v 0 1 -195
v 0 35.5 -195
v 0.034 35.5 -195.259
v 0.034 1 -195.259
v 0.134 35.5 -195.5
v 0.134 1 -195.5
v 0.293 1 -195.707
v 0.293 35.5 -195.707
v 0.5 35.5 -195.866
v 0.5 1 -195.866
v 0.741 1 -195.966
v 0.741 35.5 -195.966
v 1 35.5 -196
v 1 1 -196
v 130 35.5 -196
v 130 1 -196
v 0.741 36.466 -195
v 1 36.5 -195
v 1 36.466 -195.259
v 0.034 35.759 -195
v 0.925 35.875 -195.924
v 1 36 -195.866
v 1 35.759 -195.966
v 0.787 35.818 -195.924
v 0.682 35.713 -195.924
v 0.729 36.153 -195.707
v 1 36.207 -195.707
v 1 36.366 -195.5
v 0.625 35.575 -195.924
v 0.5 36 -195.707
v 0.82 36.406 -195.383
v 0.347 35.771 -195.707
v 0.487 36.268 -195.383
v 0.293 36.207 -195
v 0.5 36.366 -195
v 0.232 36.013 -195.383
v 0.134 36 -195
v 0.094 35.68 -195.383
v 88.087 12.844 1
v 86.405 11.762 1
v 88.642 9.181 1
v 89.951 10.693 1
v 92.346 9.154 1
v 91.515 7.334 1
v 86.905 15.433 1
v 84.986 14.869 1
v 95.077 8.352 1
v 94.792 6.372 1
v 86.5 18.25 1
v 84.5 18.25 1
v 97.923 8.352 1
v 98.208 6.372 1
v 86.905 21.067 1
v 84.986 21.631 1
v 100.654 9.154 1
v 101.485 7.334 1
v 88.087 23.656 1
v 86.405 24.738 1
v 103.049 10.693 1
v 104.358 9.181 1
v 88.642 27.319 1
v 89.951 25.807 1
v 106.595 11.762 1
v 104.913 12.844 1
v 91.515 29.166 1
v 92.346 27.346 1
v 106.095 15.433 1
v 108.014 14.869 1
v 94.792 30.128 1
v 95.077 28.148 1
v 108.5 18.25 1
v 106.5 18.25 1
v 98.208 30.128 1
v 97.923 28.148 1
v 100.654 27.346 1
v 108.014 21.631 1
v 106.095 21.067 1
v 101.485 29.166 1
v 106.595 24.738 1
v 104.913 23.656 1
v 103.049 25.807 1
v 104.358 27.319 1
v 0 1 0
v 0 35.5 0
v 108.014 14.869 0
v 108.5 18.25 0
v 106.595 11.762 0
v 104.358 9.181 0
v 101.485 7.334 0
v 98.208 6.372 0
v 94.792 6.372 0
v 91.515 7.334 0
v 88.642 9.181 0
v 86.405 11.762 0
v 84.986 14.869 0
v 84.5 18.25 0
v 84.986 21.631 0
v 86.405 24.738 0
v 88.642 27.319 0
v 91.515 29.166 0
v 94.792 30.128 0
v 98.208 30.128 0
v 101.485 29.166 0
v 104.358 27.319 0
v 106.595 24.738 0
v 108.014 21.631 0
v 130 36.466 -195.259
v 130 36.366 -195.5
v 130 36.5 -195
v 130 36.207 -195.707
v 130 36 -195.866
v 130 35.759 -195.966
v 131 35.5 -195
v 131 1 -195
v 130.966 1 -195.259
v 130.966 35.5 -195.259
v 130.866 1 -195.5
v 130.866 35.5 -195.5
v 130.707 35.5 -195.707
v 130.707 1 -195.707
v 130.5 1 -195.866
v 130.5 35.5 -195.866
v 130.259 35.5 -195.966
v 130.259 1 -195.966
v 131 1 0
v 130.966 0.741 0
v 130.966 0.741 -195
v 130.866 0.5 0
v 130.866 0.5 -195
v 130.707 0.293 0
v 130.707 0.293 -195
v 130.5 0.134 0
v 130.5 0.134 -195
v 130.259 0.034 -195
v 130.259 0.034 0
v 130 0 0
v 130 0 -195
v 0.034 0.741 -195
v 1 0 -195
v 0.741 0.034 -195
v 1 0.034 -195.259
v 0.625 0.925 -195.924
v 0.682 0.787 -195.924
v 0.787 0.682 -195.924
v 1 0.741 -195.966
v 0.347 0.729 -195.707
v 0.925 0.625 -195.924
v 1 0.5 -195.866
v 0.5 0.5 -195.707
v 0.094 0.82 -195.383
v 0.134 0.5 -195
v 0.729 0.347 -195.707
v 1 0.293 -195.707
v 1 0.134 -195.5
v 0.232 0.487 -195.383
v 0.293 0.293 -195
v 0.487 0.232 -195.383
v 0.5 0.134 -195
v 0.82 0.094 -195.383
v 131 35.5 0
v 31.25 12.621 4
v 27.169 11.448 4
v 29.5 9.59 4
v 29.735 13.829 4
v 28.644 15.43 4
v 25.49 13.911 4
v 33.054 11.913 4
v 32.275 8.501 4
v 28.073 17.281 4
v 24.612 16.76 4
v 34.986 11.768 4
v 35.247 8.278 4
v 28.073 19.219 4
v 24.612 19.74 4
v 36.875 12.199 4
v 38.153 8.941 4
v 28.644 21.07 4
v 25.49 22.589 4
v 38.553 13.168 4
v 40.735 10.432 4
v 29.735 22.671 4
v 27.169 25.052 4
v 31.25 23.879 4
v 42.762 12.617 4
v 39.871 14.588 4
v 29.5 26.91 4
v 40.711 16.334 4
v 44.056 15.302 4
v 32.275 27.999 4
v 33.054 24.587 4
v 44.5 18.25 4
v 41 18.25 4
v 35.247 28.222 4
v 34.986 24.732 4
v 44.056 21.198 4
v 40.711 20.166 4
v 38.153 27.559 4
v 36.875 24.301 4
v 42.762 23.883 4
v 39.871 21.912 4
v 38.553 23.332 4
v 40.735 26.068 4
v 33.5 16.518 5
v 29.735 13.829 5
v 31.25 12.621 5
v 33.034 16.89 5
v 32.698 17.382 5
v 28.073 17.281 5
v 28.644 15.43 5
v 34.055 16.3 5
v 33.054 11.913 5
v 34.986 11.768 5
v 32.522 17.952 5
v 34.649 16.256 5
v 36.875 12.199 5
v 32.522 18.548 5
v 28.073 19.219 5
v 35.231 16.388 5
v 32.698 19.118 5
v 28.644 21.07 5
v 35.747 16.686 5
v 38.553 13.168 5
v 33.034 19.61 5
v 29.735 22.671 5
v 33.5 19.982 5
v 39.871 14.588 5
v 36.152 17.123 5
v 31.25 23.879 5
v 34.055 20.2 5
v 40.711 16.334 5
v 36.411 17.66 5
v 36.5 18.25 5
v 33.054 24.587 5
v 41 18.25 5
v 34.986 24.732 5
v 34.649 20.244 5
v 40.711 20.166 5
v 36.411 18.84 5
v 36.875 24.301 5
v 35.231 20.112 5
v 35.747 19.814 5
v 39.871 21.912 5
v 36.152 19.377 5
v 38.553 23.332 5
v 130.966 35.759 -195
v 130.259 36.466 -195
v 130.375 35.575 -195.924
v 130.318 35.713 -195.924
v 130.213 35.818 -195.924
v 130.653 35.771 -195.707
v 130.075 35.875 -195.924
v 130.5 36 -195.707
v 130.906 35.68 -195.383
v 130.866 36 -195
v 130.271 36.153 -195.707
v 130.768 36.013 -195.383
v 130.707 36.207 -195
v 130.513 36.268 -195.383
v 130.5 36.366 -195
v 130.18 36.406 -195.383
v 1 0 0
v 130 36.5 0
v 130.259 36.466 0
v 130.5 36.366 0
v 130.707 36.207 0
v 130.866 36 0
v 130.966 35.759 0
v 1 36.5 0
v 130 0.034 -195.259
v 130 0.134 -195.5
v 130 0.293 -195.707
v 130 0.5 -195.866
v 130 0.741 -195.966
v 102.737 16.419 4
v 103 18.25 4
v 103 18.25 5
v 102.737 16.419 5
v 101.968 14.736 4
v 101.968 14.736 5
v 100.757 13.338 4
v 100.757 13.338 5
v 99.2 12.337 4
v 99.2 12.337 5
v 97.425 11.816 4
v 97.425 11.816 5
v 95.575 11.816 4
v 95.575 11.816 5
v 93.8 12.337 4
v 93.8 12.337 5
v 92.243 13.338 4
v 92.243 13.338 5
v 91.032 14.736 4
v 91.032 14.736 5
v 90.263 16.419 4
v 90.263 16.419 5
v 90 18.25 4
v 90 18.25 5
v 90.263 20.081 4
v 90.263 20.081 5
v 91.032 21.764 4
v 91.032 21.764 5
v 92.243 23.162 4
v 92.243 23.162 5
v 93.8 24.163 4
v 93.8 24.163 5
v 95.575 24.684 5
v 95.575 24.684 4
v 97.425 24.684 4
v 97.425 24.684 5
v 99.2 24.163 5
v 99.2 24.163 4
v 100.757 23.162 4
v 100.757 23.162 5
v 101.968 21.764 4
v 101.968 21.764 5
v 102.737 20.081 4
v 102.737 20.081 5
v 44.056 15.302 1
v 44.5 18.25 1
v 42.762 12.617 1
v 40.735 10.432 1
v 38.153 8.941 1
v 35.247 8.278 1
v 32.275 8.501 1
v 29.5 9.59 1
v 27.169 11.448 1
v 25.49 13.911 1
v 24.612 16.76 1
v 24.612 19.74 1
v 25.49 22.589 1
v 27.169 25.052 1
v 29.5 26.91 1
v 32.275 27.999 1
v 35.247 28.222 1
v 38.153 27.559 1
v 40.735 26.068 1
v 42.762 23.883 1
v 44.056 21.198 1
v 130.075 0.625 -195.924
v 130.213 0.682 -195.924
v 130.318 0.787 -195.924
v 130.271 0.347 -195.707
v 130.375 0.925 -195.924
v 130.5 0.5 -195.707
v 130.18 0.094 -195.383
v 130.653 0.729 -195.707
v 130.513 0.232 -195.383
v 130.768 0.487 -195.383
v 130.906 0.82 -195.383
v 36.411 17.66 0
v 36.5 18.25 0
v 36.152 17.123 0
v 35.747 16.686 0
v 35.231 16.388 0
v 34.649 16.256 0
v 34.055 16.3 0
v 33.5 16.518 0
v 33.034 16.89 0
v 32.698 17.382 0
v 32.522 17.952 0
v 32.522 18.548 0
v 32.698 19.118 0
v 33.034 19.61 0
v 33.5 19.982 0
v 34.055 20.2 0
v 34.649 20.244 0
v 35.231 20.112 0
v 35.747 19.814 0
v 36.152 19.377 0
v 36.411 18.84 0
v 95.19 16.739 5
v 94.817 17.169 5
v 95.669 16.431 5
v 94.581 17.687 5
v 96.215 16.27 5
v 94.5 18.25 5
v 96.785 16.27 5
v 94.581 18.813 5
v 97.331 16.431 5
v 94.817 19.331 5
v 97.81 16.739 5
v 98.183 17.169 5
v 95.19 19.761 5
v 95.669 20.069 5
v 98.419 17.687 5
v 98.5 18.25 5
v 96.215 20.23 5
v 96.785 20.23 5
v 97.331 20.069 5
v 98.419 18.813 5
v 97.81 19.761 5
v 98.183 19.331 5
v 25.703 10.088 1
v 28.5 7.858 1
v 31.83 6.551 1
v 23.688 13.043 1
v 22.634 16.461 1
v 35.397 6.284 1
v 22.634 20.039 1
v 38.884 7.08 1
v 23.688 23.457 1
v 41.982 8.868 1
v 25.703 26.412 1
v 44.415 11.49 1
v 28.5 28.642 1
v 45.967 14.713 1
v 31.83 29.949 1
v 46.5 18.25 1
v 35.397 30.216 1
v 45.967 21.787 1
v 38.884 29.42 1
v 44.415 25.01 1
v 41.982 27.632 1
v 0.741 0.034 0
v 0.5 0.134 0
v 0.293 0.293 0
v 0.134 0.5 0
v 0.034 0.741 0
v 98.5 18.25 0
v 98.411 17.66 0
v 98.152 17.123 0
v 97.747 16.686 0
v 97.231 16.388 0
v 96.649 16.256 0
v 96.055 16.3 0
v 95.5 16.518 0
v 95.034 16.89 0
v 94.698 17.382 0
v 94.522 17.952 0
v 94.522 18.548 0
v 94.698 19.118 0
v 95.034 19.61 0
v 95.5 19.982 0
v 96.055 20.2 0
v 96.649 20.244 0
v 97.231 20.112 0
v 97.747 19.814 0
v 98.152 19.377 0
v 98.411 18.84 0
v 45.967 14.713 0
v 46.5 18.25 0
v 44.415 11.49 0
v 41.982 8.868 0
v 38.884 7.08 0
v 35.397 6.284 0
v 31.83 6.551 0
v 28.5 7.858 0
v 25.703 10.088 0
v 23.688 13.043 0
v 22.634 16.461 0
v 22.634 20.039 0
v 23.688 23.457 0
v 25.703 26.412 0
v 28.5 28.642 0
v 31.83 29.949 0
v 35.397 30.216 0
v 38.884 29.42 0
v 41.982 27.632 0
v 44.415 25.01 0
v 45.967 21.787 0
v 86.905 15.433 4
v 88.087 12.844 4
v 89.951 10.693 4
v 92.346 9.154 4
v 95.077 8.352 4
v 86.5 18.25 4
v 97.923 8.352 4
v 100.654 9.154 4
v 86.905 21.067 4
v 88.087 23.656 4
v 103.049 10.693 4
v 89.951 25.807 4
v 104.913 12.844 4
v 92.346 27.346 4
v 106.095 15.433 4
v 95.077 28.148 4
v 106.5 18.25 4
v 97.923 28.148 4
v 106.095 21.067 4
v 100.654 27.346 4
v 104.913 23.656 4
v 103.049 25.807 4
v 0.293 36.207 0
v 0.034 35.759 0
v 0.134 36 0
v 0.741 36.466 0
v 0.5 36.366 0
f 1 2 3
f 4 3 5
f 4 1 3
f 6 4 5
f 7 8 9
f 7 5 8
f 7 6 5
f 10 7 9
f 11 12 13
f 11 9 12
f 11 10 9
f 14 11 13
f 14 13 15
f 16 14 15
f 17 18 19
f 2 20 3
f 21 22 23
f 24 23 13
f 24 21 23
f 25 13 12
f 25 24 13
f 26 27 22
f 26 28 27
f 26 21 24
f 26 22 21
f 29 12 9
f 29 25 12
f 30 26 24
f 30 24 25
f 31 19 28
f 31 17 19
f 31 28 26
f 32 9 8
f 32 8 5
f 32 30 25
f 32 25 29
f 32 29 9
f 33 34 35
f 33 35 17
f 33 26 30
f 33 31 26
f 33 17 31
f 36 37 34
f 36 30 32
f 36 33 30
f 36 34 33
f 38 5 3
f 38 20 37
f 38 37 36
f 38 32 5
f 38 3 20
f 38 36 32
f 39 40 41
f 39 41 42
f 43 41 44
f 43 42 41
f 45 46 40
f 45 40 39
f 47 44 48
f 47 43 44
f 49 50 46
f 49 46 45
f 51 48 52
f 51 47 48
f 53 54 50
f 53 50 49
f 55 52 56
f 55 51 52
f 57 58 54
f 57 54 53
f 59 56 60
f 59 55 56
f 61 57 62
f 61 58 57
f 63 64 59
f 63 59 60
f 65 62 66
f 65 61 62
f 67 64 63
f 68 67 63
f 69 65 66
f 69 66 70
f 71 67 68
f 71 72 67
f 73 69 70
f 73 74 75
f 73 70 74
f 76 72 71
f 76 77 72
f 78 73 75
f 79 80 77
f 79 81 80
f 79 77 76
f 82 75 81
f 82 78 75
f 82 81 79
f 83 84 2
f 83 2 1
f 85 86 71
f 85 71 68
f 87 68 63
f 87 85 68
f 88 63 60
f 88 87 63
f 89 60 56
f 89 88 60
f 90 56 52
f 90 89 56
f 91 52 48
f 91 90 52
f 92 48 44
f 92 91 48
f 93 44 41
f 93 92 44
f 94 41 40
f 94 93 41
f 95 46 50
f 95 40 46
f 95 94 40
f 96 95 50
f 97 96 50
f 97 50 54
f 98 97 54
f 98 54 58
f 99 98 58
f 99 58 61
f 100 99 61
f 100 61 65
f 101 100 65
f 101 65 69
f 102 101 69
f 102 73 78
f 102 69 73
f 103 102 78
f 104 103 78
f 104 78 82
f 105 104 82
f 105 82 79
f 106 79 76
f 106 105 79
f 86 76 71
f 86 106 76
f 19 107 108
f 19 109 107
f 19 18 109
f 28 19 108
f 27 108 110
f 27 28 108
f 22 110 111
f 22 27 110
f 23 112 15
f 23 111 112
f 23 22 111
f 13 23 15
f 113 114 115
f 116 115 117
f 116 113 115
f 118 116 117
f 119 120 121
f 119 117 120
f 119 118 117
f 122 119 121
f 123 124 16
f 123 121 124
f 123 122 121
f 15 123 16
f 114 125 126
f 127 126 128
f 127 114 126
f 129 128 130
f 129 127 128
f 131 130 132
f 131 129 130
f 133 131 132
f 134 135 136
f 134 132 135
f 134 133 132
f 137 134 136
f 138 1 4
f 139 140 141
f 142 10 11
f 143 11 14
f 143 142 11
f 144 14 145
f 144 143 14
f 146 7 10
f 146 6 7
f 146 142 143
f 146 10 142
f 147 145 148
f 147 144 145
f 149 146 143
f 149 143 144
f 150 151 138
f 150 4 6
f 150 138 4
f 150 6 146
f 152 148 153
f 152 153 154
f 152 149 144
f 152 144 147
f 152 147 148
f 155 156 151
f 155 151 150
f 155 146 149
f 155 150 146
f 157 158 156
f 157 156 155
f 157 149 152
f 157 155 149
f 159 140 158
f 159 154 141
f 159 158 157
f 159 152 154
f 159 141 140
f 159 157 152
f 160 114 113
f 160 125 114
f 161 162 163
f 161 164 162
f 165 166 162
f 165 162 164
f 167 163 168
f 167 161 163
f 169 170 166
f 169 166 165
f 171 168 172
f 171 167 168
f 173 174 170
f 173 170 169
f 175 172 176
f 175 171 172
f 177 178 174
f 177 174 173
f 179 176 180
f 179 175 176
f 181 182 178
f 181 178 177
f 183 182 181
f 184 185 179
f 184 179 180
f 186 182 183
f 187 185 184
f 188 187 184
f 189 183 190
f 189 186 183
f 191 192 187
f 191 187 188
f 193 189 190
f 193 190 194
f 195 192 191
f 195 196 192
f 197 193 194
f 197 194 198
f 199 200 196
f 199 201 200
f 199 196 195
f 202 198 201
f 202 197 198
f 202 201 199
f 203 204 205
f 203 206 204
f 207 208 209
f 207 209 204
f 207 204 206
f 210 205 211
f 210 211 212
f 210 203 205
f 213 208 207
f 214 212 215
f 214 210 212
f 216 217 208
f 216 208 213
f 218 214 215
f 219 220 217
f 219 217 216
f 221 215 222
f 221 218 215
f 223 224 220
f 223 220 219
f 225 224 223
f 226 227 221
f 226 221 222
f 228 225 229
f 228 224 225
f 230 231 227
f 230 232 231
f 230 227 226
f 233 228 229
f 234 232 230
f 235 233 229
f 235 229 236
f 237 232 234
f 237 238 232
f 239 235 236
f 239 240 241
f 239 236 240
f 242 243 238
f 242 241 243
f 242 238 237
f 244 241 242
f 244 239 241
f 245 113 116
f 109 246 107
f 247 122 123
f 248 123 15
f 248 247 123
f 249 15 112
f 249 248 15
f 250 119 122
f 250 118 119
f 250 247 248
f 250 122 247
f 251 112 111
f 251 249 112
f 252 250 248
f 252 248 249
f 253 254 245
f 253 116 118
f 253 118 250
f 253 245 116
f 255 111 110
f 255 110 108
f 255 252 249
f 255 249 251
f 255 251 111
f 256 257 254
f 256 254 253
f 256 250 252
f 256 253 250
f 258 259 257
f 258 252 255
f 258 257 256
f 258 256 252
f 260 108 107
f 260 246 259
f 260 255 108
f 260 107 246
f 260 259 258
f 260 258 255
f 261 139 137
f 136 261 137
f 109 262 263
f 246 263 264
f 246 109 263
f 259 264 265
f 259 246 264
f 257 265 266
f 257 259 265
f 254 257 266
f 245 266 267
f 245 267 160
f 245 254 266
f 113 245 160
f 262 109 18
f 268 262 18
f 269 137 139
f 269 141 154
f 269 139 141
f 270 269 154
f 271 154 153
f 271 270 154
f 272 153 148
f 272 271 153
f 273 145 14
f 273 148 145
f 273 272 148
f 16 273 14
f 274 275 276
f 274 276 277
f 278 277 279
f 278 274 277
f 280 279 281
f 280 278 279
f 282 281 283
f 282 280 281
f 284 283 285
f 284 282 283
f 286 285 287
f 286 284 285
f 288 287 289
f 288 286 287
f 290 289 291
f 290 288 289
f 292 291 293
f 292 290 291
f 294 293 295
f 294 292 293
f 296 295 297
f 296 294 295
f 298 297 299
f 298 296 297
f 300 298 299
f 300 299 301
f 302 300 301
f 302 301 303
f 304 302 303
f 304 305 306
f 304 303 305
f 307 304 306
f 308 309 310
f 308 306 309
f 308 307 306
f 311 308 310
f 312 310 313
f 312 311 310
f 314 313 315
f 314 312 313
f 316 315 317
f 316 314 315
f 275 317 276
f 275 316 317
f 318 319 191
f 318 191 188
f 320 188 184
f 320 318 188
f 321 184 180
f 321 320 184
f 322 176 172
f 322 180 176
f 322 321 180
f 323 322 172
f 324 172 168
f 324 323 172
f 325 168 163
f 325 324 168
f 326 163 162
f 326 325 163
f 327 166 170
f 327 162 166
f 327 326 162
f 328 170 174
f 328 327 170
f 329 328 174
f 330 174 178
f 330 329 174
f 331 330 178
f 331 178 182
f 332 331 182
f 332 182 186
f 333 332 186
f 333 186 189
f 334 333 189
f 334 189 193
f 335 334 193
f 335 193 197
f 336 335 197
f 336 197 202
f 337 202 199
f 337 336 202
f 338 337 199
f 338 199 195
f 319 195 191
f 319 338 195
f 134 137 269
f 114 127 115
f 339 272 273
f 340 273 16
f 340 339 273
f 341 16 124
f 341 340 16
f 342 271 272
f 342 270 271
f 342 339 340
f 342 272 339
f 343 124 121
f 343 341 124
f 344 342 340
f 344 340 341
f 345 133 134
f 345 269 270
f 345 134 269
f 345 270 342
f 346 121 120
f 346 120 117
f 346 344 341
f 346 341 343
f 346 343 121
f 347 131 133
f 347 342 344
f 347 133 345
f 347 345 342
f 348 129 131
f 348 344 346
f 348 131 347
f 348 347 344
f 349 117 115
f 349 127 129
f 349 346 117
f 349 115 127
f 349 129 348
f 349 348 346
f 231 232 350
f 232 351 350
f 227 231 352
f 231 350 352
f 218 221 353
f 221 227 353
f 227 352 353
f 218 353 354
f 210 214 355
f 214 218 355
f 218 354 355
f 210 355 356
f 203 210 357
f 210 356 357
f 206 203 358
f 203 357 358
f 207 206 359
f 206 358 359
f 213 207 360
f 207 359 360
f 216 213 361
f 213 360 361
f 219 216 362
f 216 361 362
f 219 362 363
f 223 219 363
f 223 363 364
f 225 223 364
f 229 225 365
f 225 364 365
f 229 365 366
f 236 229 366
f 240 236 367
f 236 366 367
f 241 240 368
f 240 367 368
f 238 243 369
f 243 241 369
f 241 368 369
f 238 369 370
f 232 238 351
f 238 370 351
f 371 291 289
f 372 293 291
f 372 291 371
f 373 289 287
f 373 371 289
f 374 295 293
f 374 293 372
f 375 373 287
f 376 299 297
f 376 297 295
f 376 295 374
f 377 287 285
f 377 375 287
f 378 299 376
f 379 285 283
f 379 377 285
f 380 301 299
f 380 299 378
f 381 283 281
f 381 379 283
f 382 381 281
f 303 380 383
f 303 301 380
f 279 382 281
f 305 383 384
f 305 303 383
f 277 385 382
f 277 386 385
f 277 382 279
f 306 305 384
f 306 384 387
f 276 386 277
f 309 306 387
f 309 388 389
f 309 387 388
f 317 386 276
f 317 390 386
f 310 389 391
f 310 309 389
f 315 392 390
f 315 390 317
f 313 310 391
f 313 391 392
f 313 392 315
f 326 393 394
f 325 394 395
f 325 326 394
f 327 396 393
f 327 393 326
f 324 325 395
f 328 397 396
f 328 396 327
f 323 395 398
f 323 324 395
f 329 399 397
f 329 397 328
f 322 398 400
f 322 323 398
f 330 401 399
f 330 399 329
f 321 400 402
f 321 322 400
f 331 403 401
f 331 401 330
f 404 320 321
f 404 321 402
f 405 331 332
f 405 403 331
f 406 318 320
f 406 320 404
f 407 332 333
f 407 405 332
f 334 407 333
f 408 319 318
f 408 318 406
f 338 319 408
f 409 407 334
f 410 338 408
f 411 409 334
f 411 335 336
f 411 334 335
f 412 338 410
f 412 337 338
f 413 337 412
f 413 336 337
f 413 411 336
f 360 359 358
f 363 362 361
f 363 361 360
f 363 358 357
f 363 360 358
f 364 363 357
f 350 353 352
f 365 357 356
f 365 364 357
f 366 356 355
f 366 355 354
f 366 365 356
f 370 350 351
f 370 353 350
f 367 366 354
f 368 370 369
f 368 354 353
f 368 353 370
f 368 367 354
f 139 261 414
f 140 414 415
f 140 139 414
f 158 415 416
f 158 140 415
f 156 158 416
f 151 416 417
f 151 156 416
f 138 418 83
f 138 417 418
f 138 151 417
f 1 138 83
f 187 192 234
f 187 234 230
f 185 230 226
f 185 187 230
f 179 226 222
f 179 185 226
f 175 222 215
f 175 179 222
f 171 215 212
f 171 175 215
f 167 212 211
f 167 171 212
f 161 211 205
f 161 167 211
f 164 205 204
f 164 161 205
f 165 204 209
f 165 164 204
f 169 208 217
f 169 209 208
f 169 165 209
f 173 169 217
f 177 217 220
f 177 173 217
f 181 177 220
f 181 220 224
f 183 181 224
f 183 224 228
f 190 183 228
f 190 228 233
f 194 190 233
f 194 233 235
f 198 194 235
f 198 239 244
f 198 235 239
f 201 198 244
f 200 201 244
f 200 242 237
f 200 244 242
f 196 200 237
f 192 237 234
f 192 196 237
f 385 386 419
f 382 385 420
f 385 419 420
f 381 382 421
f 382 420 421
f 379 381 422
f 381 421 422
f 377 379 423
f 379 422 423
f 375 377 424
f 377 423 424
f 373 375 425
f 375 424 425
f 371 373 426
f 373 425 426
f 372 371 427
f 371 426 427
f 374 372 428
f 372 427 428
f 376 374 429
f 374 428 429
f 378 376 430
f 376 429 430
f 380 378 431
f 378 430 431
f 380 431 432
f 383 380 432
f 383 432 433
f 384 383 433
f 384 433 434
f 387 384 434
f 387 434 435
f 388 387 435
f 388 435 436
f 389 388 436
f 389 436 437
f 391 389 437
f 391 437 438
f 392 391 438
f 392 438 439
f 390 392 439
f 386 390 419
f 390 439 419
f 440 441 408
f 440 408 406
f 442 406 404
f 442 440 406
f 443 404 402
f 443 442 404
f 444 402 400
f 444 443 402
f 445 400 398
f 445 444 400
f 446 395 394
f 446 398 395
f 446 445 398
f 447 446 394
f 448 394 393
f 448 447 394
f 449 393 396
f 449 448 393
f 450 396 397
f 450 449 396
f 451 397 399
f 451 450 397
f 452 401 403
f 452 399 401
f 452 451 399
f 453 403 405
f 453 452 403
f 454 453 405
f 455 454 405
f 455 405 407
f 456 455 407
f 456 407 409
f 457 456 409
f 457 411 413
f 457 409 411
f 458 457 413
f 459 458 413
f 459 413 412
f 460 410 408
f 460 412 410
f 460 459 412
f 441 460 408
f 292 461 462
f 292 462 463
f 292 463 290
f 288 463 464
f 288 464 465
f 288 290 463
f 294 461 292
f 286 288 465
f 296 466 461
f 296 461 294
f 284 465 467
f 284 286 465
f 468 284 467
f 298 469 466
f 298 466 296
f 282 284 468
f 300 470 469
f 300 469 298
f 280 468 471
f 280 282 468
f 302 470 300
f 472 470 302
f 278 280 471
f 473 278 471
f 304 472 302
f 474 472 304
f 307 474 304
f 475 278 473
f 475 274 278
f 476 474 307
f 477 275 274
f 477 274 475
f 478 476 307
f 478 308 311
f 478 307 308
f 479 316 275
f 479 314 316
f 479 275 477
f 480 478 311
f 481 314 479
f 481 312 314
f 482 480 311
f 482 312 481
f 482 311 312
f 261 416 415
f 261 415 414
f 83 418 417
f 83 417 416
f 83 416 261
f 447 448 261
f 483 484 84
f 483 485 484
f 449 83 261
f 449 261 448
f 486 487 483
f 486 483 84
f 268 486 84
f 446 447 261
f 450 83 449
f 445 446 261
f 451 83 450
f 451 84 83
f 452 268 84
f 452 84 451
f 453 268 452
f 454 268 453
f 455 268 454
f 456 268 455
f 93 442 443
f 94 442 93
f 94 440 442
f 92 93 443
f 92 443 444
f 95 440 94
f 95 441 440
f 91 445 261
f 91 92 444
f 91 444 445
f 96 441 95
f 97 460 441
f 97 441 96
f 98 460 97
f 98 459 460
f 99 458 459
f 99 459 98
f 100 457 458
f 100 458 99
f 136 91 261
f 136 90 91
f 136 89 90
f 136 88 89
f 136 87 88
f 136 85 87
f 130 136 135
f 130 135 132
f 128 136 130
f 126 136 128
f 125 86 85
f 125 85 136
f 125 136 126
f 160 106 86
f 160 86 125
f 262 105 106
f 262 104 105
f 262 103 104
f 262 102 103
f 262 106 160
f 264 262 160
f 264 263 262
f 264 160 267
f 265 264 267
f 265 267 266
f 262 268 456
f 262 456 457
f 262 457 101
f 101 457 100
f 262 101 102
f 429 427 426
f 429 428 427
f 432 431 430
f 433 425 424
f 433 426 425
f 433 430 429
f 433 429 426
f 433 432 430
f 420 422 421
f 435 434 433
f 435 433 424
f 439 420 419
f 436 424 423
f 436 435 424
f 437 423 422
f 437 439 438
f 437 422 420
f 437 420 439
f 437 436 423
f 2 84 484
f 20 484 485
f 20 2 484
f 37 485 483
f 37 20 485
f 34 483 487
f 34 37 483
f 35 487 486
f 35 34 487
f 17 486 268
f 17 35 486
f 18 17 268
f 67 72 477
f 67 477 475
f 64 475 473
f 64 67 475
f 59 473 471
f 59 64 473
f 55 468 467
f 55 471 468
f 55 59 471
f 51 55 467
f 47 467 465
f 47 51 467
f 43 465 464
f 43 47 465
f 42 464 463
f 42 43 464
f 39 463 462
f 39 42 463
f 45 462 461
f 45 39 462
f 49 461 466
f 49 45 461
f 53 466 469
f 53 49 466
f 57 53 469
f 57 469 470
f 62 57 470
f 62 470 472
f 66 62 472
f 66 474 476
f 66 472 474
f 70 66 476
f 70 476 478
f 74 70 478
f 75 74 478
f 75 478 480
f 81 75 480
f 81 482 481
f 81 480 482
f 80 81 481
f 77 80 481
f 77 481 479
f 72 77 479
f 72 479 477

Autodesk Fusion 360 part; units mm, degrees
sketch "Sketch1" plane through (0, 0, 0) normal (0, 0, 1) x (1, 0, 0)
  line L0 (0, 0) -> (131, 0)
  line L1 (131, 0) -> (131, 36.5)
  line L2 (131, 36.5) -> (0, 36.5)
  line L3 (0, 36.5) -> (0, 0)
  line L4 (65.5, 18.25) -> (96.5, 18.25)
  line L5 (65.5, 18.25) -> (34.5, 18.25)
  circle A0 centre (34.5, 18.25) radius 12
  circle A1 centre (96.5, 18.25) radius 12
  circle A2 centre (34.5, 18.25) radius 10
  circle A3 centre (96.5, 18.25) radius 10
  circle A4 centre (34.5, 18.25) radius 6.5
  circle A5 centre (96.5, 18.25) radius 6.5
  circle A6 centre (34.5, 18.25) radius 2
  circle A7 centre (96.5, 18.25) radius 2
  dimension "d1" = 131
  dimension "d2" = 36.5
  dimension "d3" = 31
  dimension "d4" = 31
  dimension "d5" = 24
  dimension "d6" = 24
  dimension "d7" = 20
  dimension "d8" = 20
  dimension "d9" = 13
  dimension "d10" = 13
  dimension "d17" = 4
  dimension "d18" = 4
extrude "Extrude1" add sketch "Sketch1" against normal blind 196 contours L0 L1 L2 L3 | A7 | A5 | A3 | A1 | A6 | A4 | A2 | A0
extrude "Extrude2" add sketch "Sketch1" along normal blind 1 contours A1 | A0
extrude "Extrude3" add sketch "Sketch1" along normal blind 4 contours A3 | A2
extrude "Extrude4" add sketch "Sketch1" along normal blind 5 contours A5 | A4
fillet "Fillet1" radius 1 4 edges at (0, 0, -98) (131, 0, -98) (131, 36.5, -98) (0, 36.5, -98) 1 faces at (13.6667, 18.25, -196)
equation "d3 = ( 62 / 2 ) * 1 mm"
equation "d4 = ( 62 / 2 ) * 1 mm"
